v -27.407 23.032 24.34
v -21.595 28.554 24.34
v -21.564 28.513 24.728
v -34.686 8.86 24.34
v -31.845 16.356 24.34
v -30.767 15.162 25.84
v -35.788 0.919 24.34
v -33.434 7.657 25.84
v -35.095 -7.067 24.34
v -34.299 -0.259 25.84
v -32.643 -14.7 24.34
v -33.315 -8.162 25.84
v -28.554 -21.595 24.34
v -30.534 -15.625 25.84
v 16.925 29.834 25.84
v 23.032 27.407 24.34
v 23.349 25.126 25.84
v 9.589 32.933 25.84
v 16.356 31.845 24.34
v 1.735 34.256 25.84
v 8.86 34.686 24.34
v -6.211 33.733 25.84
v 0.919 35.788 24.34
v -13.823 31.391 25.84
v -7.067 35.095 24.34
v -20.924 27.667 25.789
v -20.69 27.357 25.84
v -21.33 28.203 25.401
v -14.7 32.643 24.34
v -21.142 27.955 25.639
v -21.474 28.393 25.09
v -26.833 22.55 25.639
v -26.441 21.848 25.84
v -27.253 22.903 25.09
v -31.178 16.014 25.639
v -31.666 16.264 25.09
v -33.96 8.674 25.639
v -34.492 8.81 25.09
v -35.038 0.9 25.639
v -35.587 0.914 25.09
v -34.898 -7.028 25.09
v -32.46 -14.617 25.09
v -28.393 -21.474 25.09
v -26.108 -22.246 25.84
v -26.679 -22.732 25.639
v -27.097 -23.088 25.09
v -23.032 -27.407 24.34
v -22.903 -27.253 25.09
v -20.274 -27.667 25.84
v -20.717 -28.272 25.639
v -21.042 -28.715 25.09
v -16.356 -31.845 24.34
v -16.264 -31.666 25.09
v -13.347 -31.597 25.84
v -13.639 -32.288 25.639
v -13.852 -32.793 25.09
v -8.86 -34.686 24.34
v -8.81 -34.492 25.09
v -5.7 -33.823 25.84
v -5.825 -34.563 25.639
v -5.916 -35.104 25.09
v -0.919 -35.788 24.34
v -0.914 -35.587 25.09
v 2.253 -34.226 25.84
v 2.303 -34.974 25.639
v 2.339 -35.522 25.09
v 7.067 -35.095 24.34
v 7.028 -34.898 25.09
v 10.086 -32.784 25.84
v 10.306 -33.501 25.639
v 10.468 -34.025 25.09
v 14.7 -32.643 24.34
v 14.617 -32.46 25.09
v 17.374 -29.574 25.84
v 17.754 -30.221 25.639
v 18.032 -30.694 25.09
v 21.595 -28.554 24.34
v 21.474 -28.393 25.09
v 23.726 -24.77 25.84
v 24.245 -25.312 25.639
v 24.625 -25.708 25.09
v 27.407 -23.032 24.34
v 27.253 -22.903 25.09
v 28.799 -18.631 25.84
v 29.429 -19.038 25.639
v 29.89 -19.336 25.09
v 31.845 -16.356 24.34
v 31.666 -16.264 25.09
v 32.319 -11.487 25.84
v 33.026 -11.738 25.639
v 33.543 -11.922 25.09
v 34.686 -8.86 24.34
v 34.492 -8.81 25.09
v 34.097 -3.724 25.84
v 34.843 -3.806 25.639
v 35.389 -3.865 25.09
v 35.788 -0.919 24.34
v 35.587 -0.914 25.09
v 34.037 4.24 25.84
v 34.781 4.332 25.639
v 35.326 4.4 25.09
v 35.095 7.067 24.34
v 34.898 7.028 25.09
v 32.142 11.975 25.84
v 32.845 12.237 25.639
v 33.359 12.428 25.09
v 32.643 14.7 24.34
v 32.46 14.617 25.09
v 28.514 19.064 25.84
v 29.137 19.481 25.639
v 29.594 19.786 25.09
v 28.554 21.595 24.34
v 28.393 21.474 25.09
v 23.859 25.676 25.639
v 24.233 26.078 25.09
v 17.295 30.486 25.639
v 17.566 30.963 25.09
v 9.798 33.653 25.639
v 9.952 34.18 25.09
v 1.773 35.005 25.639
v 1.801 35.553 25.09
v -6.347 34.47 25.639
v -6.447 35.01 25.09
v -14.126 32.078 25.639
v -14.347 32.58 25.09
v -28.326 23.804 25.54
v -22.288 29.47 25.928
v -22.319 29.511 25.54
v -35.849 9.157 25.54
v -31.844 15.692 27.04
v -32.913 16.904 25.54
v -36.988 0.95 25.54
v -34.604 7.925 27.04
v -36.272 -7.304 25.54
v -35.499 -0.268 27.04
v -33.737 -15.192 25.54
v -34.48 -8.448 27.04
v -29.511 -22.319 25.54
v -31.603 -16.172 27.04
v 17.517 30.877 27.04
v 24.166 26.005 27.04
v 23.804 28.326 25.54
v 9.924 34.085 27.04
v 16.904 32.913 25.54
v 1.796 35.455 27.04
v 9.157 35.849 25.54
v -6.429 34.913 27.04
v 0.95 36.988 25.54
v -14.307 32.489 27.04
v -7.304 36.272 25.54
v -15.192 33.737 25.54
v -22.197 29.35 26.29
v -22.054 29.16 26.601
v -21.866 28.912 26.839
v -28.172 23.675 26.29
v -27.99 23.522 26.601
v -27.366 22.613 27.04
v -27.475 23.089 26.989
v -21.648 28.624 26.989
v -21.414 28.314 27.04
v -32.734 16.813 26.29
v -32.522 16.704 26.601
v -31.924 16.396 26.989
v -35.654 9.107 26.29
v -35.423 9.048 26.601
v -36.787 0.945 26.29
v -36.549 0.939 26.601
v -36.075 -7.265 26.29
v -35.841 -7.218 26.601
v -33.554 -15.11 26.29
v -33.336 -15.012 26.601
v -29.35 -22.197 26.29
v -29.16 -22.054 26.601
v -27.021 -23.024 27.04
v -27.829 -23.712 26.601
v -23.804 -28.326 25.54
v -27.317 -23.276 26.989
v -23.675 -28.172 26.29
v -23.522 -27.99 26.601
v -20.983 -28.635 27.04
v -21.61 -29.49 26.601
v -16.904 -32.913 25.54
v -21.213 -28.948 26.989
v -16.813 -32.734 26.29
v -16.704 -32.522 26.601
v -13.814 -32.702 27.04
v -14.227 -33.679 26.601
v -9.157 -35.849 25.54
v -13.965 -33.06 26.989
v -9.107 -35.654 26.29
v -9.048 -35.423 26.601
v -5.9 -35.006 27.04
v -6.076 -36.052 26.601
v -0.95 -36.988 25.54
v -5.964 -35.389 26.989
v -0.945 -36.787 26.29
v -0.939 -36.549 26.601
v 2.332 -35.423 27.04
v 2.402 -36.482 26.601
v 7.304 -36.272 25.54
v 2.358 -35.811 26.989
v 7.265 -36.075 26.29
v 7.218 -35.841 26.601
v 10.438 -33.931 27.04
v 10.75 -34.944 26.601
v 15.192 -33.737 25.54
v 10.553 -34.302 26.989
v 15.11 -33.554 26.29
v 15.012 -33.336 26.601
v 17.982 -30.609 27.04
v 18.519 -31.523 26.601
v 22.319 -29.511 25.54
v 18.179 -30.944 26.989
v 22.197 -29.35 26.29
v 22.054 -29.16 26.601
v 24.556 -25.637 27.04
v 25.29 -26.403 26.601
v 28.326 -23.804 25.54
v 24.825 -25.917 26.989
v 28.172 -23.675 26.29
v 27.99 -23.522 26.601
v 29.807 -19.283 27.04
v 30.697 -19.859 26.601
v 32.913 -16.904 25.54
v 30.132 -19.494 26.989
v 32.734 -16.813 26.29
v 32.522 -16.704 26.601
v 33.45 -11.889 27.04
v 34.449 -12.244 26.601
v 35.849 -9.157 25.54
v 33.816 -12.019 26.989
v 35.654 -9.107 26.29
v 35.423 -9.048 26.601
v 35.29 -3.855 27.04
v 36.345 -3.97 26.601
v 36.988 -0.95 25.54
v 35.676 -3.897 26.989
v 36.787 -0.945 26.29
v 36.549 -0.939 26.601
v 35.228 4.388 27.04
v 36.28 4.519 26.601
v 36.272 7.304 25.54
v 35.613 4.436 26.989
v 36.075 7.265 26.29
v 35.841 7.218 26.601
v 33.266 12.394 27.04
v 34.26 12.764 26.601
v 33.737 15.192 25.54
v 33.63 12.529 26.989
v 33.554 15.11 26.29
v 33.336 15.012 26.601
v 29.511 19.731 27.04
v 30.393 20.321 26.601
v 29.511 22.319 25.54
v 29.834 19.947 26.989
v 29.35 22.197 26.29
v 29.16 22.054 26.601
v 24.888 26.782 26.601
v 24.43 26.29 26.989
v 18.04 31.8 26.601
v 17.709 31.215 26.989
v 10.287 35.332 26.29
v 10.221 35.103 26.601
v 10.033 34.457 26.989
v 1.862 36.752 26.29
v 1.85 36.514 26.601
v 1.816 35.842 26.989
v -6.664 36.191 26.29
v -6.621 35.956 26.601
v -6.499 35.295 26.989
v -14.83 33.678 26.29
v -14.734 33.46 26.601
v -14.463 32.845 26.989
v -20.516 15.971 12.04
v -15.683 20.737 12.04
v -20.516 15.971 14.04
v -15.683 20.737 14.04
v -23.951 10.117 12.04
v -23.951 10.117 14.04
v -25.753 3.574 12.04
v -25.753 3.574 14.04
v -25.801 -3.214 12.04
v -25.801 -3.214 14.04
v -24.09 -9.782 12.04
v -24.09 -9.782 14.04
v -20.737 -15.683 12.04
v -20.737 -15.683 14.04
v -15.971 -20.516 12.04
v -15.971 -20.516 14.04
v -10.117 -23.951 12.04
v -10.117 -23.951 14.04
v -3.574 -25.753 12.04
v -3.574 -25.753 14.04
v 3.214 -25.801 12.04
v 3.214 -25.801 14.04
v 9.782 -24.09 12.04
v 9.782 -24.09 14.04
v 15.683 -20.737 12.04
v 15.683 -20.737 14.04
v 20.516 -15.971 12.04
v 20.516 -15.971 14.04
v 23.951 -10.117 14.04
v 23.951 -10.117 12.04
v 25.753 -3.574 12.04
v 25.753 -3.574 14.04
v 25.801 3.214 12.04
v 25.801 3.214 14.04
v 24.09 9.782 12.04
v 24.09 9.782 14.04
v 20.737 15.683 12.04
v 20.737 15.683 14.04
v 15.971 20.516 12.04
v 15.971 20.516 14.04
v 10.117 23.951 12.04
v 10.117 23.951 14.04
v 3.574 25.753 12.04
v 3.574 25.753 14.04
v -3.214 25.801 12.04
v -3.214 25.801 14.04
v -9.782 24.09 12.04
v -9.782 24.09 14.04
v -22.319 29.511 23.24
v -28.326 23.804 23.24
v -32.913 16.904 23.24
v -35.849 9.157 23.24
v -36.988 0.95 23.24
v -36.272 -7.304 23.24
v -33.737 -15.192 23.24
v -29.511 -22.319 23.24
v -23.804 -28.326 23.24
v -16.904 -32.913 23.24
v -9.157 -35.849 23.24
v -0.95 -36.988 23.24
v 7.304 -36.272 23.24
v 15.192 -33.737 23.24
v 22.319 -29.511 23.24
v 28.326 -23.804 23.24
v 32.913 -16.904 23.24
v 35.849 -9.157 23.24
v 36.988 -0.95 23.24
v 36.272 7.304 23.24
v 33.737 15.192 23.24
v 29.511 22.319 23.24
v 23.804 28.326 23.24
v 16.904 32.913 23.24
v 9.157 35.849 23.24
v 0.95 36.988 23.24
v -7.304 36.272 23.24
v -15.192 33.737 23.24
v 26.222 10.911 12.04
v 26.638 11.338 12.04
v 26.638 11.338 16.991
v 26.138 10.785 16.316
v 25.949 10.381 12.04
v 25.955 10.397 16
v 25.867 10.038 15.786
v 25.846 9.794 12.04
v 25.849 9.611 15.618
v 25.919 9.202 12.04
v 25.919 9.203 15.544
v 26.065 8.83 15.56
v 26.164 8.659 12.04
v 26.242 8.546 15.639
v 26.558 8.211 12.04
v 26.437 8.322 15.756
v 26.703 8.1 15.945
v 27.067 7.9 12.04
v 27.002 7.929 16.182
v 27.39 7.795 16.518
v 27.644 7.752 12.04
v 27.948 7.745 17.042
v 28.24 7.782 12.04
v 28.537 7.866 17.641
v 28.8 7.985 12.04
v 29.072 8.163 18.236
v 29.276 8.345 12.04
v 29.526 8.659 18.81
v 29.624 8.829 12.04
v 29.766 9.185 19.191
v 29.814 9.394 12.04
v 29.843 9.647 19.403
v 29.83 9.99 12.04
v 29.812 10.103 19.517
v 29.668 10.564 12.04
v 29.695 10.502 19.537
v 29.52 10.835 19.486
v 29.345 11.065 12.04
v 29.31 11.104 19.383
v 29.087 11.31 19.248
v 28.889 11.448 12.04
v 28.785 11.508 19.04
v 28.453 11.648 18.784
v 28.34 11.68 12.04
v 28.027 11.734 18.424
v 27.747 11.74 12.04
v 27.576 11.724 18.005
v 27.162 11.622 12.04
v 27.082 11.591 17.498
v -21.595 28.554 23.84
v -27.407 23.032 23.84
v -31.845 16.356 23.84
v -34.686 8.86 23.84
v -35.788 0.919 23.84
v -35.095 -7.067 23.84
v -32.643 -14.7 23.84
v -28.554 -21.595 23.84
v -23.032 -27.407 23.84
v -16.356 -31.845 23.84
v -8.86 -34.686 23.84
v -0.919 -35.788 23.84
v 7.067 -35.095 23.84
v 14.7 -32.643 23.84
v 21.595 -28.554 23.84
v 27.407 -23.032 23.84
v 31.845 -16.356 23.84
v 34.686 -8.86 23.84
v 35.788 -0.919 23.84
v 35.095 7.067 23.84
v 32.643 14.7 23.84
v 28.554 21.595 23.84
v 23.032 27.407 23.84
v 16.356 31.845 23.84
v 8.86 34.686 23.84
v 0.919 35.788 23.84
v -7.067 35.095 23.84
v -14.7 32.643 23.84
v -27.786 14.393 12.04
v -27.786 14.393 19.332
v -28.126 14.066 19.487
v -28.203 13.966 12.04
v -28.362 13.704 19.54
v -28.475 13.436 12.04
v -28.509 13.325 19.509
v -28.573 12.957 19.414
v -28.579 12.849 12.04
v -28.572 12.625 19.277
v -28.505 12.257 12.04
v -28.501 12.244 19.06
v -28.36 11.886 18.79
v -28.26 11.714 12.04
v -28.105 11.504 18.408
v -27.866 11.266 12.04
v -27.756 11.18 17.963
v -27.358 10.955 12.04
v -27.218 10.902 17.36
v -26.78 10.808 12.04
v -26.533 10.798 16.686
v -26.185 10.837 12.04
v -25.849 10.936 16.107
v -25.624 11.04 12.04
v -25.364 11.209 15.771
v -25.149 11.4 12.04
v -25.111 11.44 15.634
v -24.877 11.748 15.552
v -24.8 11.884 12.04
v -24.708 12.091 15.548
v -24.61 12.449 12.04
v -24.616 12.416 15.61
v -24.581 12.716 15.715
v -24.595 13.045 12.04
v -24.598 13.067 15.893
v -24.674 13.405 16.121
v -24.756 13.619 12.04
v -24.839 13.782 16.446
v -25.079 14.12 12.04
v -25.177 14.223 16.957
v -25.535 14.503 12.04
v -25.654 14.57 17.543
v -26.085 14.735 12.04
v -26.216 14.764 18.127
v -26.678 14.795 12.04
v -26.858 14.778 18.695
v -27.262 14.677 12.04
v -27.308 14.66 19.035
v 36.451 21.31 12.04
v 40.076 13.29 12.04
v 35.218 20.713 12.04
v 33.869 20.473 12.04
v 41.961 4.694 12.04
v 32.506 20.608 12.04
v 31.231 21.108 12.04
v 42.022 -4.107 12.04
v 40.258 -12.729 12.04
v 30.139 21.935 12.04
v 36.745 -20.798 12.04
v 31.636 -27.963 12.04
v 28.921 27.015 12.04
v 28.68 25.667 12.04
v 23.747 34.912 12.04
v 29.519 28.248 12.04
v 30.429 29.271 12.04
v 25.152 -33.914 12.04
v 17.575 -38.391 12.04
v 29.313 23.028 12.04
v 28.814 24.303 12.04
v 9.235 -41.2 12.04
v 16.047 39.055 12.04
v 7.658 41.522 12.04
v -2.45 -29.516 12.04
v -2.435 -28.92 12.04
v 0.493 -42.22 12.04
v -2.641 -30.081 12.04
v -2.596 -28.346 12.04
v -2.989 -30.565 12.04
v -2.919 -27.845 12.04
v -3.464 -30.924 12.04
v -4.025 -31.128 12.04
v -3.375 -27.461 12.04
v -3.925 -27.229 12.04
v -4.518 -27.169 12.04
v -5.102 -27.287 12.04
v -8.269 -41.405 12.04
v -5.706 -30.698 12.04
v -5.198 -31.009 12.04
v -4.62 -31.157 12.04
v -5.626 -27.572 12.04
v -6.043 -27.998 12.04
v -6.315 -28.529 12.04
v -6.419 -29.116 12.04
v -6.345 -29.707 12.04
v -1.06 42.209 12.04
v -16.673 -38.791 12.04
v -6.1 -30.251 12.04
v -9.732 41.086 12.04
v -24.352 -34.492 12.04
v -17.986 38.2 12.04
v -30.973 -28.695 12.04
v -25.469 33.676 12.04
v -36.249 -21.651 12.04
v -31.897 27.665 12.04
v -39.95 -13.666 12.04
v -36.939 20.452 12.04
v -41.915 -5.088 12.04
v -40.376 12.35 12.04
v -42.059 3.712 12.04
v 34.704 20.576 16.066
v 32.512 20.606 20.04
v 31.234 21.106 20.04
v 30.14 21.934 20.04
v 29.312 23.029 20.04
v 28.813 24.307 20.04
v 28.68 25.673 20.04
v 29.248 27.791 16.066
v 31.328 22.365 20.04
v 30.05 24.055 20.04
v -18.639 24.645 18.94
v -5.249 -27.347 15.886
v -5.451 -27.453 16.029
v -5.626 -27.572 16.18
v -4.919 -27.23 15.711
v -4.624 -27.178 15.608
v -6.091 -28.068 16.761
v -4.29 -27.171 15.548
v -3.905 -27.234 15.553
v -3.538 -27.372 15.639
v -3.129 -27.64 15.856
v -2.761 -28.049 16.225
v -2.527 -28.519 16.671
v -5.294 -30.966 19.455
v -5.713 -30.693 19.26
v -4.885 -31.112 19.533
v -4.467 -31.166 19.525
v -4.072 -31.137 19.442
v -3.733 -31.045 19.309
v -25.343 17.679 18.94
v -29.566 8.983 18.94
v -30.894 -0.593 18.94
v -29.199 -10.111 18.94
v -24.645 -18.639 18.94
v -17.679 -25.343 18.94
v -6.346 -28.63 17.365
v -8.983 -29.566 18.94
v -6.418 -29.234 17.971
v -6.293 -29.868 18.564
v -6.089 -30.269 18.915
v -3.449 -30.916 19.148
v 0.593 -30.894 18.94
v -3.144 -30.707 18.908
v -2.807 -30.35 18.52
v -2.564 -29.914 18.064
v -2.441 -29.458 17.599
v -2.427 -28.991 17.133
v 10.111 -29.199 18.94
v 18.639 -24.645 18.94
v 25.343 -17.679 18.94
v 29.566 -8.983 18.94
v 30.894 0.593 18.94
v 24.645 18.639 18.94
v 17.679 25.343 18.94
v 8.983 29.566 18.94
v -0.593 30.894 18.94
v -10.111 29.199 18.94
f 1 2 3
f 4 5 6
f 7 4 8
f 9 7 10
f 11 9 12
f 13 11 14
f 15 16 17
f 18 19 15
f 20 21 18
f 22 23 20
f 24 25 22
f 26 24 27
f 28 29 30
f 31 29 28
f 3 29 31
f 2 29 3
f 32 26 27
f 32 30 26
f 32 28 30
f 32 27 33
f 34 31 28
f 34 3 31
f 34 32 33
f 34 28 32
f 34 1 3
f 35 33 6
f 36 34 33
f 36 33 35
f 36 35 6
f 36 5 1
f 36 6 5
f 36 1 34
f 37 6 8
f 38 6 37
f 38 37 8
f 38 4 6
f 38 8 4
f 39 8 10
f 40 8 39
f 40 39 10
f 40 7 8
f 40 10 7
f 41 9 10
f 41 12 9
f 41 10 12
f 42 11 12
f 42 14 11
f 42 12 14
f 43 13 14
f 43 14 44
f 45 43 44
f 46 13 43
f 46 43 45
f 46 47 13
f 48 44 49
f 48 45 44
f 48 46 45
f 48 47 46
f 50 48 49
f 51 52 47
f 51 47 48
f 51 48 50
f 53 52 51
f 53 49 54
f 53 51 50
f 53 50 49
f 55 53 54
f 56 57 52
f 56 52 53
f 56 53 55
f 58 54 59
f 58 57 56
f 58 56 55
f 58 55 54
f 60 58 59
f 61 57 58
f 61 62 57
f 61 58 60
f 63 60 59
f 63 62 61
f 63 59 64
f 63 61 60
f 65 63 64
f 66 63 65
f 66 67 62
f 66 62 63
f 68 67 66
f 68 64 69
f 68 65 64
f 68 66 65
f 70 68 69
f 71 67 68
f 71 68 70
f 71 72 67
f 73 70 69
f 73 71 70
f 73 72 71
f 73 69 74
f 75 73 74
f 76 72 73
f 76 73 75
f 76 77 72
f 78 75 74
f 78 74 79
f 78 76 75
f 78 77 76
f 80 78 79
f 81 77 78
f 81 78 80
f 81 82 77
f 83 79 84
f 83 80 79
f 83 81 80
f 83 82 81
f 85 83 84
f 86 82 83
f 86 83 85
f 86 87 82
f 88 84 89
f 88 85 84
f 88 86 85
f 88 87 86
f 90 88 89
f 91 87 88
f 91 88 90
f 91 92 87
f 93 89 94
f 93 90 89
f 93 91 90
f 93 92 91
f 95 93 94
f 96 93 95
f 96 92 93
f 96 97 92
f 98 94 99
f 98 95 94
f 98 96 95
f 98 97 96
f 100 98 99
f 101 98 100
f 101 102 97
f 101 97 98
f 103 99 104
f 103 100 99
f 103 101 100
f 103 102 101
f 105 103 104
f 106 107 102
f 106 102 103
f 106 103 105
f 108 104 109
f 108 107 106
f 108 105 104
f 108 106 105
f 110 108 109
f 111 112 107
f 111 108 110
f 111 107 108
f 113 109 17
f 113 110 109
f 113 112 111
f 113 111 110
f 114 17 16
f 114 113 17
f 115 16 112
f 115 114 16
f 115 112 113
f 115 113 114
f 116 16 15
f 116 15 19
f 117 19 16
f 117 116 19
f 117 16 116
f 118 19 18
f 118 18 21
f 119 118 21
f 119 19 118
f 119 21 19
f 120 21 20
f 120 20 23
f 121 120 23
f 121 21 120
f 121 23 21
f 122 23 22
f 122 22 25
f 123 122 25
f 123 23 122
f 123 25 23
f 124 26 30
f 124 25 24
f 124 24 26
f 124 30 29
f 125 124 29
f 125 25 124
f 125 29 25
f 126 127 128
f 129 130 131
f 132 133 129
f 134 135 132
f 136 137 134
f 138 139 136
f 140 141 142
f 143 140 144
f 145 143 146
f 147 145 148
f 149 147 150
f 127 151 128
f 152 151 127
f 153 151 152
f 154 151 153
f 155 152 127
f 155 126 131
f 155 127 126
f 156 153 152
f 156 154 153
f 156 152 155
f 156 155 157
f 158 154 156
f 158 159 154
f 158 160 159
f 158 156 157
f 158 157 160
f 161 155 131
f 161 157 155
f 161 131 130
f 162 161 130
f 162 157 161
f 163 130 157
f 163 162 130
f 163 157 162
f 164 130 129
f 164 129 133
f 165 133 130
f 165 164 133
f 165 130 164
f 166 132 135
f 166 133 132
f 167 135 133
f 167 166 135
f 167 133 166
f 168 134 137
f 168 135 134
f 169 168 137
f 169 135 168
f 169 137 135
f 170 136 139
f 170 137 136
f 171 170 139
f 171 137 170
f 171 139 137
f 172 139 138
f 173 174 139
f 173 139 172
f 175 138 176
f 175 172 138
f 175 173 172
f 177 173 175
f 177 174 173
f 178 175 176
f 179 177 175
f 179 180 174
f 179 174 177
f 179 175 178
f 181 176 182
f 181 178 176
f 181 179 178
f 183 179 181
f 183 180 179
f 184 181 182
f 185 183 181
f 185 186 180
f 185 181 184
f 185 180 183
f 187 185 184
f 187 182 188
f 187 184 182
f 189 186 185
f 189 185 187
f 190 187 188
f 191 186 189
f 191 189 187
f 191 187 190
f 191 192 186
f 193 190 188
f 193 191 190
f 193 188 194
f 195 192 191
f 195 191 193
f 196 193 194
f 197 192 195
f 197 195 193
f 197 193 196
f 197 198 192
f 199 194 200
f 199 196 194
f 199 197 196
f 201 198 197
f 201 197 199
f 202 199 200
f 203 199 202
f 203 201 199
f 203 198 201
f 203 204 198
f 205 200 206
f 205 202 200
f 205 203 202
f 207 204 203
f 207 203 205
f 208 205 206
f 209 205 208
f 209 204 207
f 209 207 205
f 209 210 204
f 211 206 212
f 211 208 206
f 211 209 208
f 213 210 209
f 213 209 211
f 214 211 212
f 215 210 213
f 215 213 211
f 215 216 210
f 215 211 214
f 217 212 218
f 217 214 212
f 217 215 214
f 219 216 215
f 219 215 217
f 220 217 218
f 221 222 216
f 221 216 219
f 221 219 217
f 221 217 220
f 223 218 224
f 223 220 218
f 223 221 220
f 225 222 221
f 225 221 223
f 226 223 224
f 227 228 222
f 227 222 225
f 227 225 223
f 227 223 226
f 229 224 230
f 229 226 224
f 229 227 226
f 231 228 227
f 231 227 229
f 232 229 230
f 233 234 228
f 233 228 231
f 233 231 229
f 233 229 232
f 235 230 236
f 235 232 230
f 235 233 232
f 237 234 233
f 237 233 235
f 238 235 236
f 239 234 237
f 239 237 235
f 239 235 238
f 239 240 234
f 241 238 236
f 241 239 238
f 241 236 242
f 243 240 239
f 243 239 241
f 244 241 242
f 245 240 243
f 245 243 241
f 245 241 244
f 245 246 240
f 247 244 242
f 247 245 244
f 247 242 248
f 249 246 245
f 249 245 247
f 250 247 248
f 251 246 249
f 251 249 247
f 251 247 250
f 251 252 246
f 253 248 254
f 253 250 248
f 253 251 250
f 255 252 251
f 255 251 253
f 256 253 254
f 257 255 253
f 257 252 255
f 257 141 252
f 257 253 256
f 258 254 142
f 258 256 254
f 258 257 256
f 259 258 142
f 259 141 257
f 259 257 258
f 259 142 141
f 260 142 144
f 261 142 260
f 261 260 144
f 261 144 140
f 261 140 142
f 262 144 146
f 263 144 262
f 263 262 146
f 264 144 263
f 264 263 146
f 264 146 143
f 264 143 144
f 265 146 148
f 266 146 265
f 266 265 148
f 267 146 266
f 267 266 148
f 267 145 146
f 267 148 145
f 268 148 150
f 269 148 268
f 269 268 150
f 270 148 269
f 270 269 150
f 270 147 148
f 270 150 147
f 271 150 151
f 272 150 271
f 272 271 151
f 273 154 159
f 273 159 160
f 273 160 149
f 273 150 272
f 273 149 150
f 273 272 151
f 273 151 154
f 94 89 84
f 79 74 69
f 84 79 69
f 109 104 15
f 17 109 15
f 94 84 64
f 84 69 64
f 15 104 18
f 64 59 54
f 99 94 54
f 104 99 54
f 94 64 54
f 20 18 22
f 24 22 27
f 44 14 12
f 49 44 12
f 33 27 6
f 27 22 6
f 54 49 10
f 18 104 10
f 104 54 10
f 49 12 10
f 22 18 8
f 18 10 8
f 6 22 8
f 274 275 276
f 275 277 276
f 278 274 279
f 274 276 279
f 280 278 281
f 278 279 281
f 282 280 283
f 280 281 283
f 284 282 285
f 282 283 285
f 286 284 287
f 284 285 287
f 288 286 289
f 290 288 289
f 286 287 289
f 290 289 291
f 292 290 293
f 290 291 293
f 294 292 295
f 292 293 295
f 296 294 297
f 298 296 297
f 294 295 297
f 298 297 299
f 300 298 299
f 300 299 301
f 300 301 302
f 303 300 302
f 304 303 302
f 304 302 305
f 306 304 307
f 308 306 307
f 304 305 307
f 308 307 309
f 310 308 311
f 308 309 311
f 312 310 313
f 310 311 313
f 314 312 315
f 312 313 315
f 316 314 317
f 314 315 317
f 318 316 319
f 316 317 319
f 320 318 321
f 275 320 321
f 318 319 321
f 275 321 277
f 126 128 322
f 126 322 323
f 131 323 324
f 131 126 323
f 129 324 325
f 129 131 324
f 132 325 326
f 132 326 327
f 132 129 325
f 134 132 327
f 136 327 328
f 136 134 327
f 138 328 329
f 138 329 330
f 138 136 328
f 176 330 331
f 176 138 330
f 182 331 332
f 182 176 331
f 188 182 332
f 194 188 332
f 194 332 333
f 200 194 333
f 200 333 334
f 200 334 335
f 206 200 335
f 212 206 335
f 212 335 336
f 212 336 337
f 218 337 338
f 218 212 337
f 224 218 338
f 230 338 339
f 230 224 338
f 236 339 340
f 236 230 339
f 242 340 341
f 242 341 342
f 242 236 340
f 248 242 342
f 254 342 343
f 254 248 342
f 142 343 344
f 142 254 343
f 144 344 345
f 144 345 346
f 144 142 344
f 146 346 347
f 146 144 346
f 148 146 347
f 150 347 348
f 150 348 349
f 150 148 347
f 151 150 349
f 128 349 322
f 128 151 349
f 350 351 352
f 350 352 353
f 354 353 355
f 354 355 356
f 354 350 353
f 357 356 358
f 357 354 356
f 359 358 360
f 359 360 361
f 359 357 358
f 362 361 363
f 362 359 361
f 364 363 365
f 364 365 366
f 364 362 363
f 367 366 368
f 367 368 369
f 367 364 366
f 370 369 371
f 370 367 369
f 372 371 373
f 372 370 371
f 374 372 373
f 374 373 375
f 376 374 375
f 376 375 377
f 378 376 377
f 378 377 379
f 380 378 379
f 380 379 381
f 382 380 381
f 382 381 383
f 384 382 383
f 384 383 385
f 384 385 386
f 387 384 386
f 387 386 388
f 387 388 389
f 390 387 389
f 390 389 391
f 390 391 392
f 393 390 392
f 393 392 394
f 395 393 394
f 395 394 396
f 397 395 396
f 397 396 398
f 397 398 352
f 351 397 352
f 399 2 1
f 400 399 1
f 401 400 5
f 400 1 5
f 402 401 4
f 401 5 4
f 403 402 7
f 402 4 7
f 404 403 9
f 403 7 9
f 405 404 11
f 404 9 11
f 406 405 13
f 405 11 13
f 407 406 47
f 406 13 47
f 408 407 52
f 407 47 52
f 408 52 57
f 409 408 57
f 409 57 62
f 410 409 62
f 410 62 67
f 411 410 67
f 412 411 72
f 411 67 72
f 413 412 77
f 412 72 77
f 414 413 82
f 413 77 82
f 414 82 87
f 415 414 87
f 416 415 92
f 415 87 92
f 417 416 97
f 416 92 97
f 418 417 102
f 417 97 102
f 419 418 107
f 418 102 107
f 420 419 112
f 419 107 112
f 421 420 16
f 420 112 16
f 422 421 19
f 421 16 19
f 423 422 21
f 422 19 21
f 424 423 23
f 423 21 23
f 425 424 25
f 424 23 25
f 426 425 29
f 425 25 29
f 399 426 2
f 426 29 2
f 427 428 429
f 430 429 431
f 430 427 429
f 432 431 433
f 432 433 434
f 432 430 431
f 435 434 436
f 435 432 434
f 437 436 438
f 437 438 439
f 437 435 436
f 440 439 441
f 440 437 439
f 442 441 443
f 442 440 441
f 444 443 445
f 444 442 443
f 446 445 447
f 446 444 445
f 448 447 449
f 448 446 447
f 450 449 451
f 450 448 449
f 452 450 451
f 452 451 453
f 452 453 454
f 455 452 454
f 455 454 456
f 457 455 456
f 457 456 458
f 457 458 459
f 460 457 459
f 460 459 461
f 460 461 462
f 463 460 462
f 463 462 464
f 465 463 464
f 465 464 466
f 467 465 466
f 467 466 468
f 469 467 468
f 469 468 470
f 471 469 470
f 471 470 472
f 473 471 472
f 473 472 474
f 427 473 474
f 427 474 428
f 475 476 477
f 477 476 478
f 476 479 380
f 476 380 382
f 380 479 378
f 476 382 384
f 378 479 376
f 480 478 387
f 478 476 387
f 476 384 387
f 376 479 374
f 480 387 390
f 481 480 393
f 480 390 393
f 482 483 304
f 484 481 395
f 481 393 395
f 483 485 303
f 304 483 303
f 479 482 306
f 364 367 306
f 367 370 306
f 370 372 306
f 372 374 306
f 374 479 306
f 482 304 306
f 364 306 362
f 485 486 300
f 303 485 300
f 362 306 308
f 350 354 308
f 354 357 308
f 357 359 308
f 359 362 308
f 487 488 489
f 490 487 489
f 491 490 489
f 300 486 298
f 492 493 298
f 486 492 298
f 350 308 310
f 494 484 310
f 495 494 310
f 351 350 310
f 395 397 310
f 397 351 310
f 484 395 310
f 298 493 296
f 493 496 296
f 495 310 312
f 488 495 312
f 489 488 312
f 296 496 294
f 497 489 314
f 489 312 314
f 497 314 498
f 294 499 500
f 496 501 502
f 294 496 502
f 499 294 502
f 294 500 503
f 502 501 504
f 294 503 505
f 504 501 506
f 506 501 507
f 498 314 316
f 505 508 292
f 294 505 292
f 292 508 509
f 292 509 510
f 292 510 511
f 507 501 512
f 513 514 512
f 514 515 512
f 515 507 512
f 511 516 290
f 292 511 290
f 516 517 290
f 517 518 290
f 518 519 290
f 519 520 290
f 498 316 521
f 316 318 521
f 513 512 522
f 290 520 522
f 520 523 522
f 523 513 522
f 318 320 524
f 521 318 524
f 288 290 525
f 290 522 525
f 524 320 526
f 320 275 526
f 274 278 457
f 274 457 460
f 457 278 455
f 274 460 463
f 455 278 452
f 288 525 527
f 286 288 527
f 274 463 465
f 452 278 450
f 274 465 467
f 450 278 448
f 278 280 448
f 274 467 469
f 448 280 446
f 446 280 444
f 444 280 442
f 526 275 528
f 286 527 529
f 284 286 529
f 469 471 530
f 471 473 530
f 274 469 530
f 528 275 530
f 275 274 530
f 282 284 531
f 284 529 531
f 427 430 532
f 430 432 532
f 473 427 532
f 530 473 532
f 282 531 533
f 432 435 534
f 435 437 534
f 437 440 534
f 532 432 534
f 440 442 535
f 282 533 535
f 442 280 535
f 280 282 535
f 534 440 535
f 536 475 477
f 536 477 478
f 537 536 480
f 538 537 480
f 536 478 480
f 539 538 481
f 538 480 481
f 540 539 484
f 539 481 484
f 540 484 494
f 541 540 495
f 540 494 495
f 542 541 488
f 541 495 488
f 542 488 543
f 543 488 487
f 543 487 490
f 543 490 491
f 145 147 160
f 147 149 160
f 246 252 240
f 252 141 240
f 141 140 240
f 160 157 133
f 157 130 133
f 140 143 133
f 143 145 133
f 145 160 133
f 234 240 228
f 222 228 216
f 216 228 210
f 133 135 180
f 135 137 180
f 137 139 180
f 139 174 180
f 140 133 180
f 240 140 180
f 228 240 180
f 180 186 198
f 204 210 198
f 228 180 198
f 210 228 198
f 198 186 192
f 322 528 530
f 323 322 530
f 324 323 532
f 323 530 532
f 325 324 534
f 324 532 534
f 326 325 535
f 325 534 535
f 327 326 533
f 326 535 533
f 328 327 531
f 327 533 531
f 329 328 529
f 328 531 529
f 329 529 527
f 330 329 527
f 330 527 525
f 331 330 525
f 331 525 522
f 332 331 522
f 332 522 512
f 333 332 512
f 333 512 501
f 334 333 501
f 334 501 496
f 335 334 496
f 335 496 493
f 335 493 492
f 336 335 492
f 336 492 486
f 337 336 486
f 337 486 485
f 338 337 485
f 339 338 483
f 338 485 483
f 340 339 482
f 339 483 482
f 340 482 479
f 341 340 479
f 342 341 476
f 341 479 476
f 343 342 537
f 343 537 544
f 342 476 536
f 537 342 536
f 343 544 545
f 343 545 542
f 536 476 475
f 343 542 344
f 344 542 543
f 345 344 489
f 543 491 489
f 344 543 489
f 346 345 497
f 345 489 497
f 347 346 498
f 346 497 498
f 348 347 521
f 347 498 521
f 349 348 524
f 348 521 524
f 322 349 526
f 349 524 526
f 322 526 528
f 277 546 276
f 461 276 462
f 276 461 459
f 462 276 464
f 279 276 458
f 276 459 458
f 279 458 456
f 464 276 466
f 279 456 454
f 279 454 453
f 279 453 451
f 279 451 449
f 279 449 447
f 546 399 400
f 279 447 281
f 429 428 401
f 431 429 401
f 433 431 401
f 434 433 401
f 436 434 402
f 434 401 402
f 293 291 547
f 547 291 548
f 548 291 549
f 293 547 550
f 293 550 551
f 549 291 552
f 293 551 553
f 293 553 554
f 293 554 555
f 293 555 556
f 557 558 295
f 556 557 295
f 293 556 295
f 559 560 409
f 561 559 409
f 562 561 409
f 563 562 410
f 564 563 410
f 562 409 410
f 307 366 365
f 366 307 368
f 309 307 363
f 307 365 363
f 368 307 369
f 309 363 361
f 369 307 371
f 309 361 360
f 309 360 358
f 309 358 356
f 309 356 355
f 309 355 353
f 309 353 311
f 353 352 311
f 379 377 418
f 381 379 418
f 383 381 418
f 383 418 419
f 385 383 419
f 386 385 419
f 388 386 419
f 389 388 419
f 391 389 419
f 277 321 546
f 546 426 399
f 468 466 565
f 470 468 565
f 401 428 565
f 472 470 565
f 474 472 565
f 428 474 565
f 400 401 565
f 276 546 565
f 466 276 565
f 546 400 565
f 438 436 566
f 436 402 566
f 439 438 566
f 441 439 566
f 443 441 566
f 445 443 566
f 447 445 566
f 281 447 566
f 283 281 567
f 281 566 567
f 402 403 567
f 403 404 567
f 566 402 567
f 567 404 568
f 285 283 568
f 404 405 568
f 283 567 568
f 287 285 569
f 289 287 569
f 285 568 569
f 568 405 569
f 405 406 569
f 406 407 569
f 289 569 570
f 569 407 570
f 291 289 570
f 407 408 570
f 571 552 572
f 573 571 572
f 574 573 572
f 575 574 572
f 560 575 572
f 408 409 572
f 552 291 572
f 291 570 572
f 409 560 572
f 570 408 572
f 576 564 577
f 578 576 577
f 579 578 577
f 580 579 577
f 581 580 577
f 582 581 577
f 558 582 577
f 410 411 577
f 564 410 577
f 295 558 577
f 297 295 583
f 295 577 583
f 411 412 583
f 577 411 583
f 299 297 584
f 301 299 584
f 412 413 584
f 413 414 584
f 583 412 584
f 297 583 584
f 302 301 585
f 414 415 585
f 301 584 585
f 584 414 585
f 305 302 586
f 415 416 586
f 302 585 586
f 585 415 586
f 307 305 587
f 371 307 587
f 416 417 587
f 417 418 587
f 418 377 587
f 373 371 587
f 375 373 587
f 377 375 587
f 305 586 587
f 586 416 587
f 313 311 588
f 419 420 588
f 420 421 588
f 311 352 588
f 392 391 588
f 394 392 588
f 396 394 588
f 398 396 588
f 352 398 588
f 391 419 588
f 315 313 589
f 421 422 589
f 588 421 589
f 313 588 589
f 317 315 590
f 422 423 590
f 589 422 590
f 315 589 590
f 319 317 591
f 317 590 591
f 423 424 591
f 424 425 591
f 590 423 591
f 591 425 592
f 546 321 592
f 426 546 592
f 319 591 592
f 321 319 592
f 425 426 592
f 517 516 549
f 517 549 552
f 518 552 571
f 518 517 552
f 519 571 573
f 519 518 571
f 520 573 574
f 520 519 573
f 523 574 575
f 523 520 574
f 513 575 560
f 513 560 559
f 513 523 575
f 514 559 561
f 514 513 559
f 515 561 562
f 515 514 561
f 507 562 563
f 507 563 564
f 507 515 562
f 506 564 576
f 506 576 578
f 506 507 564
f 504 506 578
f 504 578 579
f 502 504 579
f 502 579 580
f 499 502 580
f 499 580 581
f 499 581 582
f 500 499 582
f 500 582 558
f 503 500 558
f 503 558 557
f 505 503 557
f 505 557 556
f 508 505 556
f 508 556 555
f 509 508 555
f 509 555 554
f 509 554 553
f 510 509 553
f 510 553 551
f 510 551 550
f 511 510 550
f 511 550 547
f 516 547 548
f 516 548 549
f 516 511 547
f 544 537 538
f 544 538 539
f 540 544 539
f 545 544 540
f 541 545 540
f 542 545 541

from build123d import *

# Parameters (mm, degrees)
POCKET001_DEPTH         = 8
FILLET_R                = 1.5
SKETCH021_R             = 2
POCKET006_DEPTH         = 8
BODY003_PLACEMENT_ANGLE = 127.1


with BuildPart() as part:
    # Sketch009 → Revolution002 (revolve)
    with BuildSketch(Plane.XZ):
        Polygon((35.8, -1.2), (0, -1.2), (0, 0), (37, 0), (37, -2.8), (37, -3.8), (42.222646, -15), (26, -15), (26, -13), (35.8, -3.2), align=None)
    revolve(axis=Axis((0, 0, 0), (0, 0, 1)))

    # Sketch010 (on Face6 of Revolution002) → Pocket001 (cut)
    with BuildSketch(Plane(origin=(0, 0, -15), x_dir=(1, 0, 0), z_dir=(0, 0, -1))):
        with BuildLine():
            ThreePointArc((-4.991228, 41.926596), (0, 37.222646), (4.991228, 41.926596))
            ThreePointArc((4.991228, 41.926596), (0, 42.222646), (-4.991228, 41.926596))
        make_face()
    extrude(amount=-POCKET001_DEPTH, mode=Mode.SUBTRACT)

    # Fillet
    fillet_edges = [part.edges().sort_by_distance(p)[0] for p in [
        (-37, 0, 0),
        (-35.8, 0, -1.2),
    ]]
    fillet(fillet_edges, radius=FILLET_R)

    # Sketch021 → Pocket006 (cut)
    with BuildSketch(Plane.XY.offset(-15)):
        with Locations((-9.025876, -28.085291)):
            Circle(SKETCH021_R)
        with Locations((26.240123, 13.479835)):
            Circle(SKETCH021_R)
        with Locations((-20.597214, 21.118825)):
            Circle(SKETCH021_R)
    extrude(amount=POCKET006_DEPTH, mode=Mode.SUBTRACT)


with BuildPart() as part_1:
    # Body003 placement: moved
    add(part.part.moved(Location((0, 0, 27.04))).rotate(Axis((0, 0, 27.04), (0, 0, 1)), BODY003_PLACEMENT_ANGLE))


solid = part_1.part
